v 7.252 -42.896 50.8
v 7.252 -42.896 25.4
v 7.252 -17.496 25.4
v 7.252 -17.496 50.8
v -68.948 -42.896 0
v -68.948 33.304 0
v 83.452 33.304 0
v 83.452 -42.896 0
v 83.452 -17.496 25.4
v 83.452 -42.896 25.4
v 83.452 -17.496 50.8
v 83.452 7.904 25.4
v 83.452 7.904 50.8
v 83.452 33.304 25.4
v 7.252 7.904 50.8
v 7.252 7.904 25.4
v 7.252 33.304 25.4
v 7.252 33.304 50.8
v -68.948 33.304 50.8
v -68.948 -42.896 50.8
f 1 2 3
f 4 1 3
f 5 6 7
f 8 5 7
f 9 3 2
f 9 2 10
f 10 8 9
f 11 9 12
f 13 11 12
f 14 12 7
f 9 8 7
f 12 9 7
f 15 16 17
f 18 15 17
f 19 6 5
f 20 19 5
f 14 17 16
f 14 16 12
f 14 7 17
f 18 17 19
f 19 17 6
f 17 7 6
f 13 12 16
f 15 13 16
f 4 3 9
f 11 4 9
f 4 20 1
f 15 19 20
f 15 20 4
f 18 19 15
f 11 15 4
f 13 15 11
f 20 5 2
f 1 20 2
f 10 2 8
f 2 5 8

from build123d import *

# Parameters (mm, degrees)
F1_DEPTH = 50.8
F0_W     = 76.2
F0_H     = 25.4
F2_DEPTH = 25.4


with BuildPart() as f1:
    # F0 (on Top) → F1 (new body)
    with BuildSketch(Plane.XY):
        Polygon((7.2523672134, 33.3039297216), (-68.9476327866, 33.3039297216), (-68.9476327866, -42.8960702784), (7.2523672134, -42.8960702784), (7.2523672134, -17.4960702784), (83.4523672134, -17.4960702784), (83.4523672134, 7.9039297216), (7.2523672134, 7.9039297216), align=None)
    extrude(amount=F1_DEPTH)

    # F0 (on Top) → F2 (join)
    with BuildSketch(Plane.XY):
        Polygon((7.2523672134, 33.3039297216), (-68.9476327866, 33.3039297216), (-68.9476327866, -42.8960702784), (7.2523672134, -42.8960702784), (7.2523672134, -17.4960702784), (83.4523672134, -17.4960702784), (83.4523672134, 7.9039297216), (7.2523672134, 7.9039297216), align=None)
        with Locations((45.3523672134, 20.6039297216)):
            Rectangle(F0_W, F0_H)
        with Locations((45.3523672134, -30.1960702784)):
            Rectangle(F0_W, F0_H)
    extrude(amount=F2_DEPTH)


solid = f1.part
